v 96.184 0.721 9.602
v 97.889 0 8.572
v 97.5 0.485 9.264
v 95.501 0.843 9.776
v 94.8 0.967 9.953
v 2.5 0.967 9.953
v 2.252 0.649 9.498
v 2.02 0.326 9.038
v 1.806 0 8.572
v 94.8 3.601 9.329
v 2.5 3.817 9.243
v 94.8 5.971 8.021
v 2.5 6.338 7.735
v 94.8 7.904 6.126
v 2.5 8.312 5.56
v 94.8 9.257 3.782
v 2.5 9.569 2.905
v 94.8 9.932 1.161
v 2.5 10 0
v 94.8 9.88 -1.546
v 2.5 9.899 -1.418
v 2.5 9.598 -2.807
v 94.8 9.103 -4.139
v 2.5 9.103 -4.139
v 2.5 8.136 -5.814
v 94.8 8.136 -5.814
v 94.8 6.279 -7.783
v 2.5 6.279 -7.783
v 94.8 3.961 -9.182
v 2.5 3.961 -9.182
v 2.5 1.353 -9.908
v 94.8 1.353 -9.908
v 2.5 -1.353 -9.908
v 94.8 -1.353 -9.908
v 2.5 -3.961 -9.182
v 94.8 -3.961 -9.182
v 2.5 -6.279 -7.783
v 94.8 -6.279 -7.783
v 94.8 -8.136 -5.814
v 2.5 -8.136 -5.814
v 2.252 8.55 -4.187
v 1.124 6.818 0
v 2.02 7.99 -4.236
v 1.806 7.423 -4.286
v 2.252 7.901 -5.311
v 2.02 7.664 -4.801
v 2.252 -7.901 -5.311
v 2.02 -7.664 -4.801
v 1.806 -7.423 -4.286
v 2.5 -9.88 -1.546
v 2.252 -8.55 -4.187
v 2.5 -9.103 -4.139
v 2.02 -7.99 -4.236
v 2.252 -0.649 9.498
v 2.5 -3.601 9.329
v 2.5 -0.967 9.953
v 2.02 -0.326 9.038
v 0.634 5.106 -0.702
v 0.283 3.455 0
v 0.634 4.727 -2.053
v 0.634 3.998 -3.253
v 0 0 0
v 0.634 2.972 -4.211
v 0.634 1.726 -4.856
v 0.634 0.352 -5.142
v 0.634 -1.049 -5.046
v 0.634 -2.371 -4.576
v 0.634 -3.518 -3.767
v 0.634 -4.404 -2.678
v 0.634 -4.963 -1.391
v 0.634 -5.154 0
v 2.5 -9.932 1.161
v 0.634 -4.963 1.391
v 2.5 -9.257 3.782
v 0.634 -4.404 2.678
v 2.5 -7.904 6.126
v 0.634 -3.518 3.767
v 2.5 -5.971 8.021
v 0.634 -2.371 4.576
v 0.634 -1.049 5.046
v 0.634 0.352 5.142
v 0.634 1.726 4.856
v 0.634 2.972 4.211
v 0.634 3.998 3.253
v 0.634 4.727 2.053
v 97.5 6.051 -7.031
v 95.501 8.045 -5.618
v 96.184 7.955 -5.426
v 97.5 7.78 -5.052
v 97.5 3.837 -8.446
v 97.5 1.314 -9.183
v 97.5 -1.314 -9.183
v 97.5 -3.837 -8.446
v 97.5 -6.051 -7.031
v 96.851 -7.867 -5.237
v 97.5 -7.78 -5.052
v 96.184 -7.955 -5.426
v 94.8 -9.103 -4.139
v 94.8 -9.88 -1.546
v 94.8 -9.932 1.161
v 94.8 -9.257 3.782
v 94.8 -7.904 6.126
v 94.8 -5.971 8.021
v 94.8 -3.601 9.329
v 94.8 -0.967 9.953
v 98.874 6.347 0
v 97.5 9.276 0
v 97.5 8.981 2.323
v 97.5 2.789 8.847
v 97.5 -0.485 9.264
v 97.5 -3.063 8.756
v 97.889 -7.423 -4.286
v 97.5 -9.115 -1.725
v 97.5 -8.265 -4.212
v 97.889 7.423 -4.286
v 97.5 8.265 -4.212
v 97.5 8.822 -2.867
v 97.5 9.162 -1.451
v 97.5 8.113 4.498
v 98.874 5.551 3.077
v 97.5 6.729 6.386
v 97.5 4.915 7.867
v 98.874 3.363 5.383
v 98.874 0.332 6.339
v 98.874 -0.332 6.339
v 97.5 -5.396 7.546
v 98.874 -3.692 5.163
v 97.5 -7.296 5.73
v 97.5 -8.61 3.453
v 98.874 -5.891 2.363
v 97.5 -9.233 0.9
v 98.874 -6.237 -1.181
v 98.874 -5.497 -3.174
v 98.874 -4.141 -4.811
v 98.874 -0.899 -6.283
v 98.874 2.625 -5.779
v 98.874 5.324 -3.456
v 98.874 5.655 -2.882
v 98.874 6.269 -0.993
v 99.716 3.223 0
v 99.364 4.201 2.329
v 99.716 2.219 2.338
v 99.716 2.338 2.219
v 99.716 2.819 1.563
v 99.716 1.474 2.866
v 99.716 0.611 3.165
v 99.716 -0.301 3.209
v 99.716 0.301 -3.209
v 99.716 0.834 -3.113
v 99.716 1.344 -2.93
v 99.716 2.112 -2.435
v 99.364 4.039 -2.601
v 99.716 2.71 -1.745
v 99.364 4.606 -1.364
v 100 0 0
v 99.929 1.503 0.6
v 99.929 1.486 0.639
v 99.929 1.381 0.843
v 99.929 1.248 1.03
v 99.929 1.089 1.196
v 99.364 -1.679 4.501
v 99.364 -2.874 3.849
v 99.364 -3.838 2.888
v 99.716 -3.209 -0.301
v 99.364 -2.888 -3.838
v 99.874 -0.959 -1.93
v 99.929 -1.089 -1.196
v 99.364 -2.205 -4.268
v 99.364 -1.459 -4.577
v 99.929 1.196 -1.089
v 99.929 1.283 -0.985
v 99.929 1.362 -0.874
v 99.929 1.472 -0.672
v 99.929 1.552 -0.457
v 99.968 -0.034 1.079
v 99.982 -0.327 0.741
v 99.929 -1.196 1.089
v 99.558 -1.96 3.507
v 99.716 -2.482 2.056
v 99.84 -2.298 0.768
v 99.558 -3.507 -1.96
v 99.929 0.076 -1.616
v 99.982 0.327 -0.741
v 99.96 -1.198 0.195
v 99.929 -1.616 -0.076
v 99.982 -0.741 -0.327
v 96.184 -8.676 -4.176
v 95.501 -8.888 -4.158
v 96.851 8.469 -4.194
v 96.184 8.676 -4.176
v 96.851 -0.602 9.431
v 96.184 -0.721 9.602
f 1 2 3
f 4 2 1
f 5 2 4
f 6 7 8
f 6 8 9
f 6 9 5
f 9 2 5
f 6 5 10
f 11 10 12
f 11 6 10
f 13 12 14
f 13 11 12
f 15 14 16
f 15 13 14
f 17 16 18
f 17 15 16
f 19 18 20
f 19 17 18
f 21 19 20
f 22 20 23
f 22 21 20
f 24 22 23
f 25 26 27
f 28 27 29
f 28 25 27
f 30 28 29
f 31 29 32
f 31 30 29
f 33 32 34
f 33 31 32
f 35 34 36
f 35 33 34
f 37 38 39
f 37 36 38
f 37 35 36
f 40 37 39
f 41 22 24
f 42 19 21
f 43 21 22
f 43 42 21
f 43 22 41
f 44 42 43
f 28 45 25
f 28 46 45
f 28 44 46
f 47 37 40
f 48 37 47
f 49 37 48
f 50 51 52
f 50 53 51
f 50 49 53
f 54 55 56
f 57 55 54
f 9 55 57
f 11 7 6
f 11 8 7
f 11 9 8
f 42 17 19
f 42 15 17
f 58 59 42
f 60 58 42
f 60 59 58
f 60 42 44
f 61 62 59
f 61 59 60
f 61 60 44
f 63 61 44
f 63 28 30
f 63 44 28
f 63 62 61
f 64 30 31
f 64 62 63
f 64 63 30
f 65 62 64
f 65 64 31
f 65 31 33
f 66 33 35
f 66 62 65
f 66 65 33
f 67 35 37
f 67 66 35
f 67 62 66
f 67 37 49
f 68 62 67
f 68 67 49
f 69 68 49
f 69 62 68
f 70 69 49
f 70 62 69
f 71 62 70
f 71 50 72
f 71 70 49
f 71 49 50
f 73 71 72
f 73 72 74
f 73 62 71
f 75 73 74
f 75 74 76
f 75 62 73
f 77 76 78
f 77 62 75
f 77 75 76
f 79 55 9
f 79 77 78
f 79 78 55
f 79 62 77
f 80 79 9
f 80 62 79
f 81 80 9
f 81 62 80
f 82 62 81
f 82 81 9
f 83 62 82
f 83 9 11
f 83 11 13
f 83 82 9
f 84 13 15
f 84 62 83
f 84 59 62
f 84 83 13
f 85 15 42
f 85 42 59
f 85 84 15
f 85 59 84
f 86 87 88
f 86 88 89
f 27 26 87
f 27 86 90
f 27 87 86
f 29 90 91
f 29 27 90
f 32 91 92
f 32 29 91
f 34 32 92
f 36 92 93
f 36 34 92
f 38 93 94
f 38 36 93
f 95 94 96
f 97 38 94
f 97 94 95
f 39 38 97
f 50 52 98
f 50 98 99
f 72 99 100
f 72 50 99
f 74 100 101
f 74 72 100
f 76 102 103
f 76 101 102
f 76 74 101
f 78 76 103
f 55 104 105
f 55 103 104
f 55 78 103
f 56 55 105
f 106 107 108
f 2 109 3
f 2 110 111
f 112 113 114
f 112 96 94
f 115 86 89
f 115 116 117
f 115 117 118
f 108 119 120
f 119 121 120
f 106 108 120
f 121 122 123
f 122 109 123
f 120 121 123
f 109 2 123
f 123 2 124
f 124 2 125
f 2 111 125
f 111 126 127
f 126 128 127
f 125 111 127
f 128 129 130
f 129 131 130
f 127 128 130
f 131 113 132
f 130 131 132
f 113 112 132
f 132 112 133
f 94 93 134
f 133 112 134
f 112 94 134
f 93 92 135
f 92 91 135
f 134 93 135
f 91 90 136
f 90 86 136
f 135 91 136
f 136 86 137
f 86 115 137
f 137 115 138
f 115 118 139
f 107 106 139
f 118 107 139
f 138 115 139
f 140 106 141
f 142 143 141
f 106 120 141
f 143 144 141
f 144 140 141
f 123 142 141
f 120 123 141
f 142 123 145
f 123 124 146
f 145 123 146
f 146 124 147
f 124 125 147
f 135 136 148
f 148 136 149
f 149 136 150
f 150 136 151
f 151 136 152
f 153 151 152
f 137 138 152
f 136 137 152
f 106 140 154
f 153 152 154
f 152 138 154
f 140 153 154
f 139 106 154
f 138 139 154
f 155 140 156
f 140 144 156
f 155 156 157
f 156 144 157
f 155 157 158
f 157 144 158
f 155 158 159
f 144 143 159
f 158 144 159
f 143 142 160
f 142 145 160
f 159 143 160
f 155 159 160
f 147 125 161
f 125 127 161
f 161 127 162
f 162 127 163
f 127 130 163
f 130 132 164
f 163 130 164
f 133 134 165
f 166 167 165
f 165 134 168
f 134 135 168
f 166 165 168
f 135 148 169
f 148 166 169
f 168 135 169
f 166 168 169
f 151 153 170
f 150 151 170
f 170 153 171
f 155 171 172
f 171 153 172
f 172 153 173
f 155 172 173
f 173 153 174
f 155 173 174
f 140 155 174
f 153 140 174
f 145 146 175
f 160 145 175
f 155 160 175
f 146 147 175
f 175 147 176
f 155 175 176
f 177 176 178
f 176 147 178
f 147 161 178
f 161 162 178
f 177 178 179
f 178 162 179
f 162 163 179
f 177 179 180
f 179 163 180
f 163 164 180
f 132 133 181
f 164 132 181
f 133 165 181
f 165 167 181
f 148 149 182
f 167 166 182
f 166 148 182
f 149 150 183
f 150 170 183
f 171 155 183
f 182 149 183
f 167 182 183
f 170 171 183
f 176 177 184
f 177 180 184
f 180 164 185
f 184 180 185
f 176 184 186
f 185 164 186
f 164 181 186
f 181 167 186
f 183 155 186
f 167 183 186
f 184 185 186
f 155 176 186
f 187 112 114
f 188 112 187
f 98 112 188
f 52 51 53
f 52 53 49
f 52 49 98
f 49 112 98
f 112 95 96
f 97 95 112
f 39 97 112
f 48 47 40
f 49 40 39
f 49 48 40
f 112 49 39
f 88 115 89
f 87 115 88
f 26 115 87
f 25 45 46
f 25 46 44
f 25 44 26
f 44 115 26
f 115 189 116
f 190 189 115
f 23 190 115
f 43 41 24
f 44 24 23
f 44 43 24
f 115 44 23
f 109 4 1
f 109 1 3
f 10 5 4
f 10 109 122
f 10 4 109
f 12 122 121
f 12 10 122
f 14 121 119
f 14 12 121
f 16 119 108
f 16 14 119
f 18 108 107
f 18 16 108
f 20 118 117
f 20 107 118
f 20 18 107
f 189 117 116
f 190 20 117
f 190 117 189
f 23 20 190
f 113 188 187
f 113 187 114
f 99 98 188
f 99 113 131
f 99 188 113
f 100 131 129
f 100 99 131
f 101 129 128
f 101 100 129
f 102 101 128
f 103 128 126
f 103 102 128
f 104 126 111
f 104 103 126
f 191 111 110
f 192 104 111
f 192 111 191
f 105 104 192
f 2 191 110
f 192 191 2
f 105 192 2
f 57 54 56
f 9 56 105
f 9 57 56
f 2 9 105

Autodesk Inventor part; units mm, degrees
ref_plane "YZ Plane" through (0, 0, 0) normal (1, 0, 0) x (0, 1, 0)
ref_plane "XZ Plane" through (0, 0, 0) normal (0, 1, 0) x (-1, 0, 0)
ref_plane "XY Plane" through (0, 0, 0) normal (0, 0, 1) x (1, 0, 0)
sketch "Sketch1" plane through (0, 0, 0) normal (0, 0, 1) x (1, 0, 0)
  line L0 (97.5, 9.2765) -> (94.8, 10)
  line L1 (94.8, 10) -> (2.5, 10)
  line L2 (0, 0) -> (100, 0)
  arc A0 (100, 0) -> (97.5, 9.2765) centre (81.5392, 0) ccw
  arc A1 (2.5, 10) -> (0, 0) centre (21.25, 0) ccw
  dimension "d0" = 100
  dimension "d1" = 20
  dimension "d2" = 5.2
  dimension "d3" = 15
  dimension "d4" = 2.5
  dimension "d5" = 2.5
revolve "Body" add sketch "Sketch1" angle 360 about axis through (0, 0, 0) along (1, 0, 0)
sketch "Sketch2" plane through (0, 0, 0) normal (1, 0, 0) x (0, 1, 0)
  circle A0 centre (0, 0) radius 10 projected
  line L0 (0, 10) -> (-1, 10)
  line L1 (0, 10) -> (1, 10)
  line L2 (-1, 10) -> (0, 8.5719)
  line L3 (0, 8.5719) -> (1, 10)
  line L4 (0, -14) -> (0, 14) projected
  dimension "d6" = 35
  dimension "d7" = 35
  dimension "d8" = 1
extrude "Groove" cut sketch "Sketch2" along normal through all contours L3 L4 A0 | A0 L1 L3 | L4 L2 A0 | A0 L2 L0 picked at (0.5375, 9.5014) picked at (-0.5375, 9.5014)
pattern_circular "Grooves" count 3 over 360 about axis through (-10, 0, 0) along (1, 0, 0) of "Groove"
equation "\"d0\" = NLG"
equation "\"d1\" = NND"
equation "\"d2\" = PHH"
equation "\"d3\" = FAWI"
equation "\"d4\" = KAH"
equation "\"d5\" = KAH"
equation "\"d8\" = 0.05 * NND"
equation "\"NND\" = 20"
equation "\"NLG\" = 100"
equation "\"PHH\" = 5.2"
equation "\"FAWI\" = 15deg"
equation "\"KAH\" = 2.5"
equation "\"d13\" = -KAH"
equation "\"d28\" = KAH"
equation "\"NND1\" = 20.5"
equation "\"KAH1\" = 2"
equation "\"NLG1\" = 98"
properties part number "ISO 8740 - 20 x 100" material "Stainless Steel, Austenitic"
